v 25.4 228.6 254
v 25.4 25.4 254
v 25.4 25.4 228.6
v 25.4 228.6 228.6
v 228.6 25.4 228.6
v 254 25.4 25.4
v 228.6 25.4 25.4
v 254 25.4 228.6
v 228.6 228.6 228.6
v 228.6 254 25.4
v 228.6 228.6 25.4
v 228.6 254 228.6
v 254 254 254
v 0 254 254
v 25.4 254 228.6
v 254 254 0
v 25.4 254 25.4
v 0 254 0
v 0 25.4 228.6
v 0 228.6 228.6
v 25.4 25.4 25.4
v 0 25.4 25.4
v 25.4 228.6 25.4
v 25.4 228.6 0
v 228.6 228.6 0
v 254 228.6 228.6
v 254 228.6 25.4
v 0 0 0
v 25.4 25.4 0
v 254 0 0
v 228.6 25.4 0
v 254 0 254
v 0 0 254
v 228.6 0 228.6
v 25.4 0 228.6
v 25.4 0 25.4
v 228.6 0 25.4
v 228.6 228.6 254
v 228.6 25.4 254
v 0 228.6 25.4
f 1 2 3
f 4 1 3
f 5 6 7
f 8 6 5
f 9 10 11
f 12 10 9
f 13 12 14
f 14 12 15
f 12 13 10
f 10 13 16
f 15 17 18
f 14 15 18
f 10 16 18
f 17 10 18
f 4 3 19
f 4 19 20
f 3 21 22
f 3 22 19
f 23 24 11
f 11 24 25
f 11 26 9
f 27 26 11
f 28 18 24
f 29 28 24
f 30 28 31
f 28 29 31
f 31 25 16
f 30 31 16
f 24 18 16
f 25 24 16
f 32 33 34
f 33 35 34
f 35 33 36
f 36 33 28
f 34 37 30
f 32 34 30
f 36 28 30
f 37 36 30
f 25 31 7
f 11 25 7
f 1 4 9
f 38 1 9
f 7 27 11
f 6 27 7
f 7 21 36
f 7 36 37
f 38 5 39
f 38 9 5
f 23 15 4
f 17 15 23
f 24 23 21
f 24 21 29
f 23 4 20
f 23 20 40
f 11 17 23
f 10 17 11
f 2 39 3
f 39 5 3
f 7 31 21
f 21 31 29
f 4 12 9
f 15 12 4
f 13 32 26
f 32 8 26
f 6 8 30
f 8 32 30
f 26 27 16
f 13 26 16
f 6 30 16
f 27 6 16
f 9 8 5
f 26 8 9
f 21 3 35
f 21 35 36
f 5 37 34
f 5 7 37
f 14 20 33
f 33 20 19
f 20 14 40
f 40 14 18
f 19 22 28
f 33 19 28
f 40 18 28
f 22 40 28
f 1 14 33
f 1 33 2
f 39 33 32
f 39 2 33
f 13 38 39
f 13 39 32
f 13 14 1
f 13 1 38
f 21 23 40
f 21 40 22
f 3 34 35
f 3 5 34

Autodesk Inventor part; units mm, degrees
ref_plane "YZ Plane" through (0, 0, 0) normal (1, 0, 0) x (0, 1, 0)
ref_plane "XZ Plane" through (0, 0, 0) normal (0, 1, 0) x (-1, 0, 0)
ref_plane "XY Plane" through (0, 0, 0) normal (0, 0, 1) x (1, 0, 0)
sketch "Sketch1" plane through (0, 0, 0) normal (0, 0, 1) x (1, 0, 0)
  line L0 (0, 0) -> (254, 0)
  line L1 (254, 0) -> (254, 254)
  line L2 (254, 254) -> (0, 254)
  line L3 (0, 254) -> (0, 0)
  line L4 (25.4, 228.6) -> (228.6, 228.6)
  line L5 (228.6, 228.6) -> (228.6, 25.4)
  line L6 (228.6, 25.4) -> (25.4, 25.4)
  line L7 (25.4, 25.4) -> (25.4, 228.6)
  dimension "d0" = 254
  dimension "d1" = 25.4
extrude "Extrusion1" add sketch "Sketch1" along normal blind 254
sketch "Sketch2" plane through (0, 254, 0) normal (0, 1, 0) x (1, 0, 0)
  line L0 (254, 0) -> (0, 0) projected
  line L1 (0, 0) -> (0, -254) projected
  line L2 (254, -254) -> (0, -254) projected
  line L3 (254, 0) -> (254, -254) projected
  line L4 (25.4, -228.6) -> (25.4, -25.4)
  line L5 (25.4, -25.4) -> (228.6, -25.4)
  line L6 (228.6, -25.4) -> (228.6, -228.6)
  line L7 (228.6, -228.6) -> (25.4, -228.6)
  dimension "d4" = 25.4
extrude "Extrusion2" cut sketch "Sketch2" against normal blind 254 contours L4 L5 L6 L7
sketch "Sketch3" plane through (254, 0, 0) normal (1, 0, 0) x (0, 0, -1)
  line L0 (0, 0) -> (0, 254) projected
  line L1 (0, 254) -> (-254, 254) projected
  line L2 (-254, 0) -> (-254, 254) projected
  line L3 (0, 0) -> (-254, 0) projected
  line L4 (0, 0) -> (0, 254) projected
  line L5 (-25.4, 228.6) -> (-25.4, 25.4)
  line L6 (-25.4, 25.4) -> (-228.6, 25.4)
  line L7 (-228.6, 25.4) -> (-228.6, 228.6)
  line L8 (-228.6, 228.6) -> (-25.4, 228.6)
  dimension "d7" = 25.4
extrude "Extrusion3" cut sketch "Sketch3" against normal blind 254 contours L5 L6 L7 L8
properties part number "CUBE for Game Design_1"
